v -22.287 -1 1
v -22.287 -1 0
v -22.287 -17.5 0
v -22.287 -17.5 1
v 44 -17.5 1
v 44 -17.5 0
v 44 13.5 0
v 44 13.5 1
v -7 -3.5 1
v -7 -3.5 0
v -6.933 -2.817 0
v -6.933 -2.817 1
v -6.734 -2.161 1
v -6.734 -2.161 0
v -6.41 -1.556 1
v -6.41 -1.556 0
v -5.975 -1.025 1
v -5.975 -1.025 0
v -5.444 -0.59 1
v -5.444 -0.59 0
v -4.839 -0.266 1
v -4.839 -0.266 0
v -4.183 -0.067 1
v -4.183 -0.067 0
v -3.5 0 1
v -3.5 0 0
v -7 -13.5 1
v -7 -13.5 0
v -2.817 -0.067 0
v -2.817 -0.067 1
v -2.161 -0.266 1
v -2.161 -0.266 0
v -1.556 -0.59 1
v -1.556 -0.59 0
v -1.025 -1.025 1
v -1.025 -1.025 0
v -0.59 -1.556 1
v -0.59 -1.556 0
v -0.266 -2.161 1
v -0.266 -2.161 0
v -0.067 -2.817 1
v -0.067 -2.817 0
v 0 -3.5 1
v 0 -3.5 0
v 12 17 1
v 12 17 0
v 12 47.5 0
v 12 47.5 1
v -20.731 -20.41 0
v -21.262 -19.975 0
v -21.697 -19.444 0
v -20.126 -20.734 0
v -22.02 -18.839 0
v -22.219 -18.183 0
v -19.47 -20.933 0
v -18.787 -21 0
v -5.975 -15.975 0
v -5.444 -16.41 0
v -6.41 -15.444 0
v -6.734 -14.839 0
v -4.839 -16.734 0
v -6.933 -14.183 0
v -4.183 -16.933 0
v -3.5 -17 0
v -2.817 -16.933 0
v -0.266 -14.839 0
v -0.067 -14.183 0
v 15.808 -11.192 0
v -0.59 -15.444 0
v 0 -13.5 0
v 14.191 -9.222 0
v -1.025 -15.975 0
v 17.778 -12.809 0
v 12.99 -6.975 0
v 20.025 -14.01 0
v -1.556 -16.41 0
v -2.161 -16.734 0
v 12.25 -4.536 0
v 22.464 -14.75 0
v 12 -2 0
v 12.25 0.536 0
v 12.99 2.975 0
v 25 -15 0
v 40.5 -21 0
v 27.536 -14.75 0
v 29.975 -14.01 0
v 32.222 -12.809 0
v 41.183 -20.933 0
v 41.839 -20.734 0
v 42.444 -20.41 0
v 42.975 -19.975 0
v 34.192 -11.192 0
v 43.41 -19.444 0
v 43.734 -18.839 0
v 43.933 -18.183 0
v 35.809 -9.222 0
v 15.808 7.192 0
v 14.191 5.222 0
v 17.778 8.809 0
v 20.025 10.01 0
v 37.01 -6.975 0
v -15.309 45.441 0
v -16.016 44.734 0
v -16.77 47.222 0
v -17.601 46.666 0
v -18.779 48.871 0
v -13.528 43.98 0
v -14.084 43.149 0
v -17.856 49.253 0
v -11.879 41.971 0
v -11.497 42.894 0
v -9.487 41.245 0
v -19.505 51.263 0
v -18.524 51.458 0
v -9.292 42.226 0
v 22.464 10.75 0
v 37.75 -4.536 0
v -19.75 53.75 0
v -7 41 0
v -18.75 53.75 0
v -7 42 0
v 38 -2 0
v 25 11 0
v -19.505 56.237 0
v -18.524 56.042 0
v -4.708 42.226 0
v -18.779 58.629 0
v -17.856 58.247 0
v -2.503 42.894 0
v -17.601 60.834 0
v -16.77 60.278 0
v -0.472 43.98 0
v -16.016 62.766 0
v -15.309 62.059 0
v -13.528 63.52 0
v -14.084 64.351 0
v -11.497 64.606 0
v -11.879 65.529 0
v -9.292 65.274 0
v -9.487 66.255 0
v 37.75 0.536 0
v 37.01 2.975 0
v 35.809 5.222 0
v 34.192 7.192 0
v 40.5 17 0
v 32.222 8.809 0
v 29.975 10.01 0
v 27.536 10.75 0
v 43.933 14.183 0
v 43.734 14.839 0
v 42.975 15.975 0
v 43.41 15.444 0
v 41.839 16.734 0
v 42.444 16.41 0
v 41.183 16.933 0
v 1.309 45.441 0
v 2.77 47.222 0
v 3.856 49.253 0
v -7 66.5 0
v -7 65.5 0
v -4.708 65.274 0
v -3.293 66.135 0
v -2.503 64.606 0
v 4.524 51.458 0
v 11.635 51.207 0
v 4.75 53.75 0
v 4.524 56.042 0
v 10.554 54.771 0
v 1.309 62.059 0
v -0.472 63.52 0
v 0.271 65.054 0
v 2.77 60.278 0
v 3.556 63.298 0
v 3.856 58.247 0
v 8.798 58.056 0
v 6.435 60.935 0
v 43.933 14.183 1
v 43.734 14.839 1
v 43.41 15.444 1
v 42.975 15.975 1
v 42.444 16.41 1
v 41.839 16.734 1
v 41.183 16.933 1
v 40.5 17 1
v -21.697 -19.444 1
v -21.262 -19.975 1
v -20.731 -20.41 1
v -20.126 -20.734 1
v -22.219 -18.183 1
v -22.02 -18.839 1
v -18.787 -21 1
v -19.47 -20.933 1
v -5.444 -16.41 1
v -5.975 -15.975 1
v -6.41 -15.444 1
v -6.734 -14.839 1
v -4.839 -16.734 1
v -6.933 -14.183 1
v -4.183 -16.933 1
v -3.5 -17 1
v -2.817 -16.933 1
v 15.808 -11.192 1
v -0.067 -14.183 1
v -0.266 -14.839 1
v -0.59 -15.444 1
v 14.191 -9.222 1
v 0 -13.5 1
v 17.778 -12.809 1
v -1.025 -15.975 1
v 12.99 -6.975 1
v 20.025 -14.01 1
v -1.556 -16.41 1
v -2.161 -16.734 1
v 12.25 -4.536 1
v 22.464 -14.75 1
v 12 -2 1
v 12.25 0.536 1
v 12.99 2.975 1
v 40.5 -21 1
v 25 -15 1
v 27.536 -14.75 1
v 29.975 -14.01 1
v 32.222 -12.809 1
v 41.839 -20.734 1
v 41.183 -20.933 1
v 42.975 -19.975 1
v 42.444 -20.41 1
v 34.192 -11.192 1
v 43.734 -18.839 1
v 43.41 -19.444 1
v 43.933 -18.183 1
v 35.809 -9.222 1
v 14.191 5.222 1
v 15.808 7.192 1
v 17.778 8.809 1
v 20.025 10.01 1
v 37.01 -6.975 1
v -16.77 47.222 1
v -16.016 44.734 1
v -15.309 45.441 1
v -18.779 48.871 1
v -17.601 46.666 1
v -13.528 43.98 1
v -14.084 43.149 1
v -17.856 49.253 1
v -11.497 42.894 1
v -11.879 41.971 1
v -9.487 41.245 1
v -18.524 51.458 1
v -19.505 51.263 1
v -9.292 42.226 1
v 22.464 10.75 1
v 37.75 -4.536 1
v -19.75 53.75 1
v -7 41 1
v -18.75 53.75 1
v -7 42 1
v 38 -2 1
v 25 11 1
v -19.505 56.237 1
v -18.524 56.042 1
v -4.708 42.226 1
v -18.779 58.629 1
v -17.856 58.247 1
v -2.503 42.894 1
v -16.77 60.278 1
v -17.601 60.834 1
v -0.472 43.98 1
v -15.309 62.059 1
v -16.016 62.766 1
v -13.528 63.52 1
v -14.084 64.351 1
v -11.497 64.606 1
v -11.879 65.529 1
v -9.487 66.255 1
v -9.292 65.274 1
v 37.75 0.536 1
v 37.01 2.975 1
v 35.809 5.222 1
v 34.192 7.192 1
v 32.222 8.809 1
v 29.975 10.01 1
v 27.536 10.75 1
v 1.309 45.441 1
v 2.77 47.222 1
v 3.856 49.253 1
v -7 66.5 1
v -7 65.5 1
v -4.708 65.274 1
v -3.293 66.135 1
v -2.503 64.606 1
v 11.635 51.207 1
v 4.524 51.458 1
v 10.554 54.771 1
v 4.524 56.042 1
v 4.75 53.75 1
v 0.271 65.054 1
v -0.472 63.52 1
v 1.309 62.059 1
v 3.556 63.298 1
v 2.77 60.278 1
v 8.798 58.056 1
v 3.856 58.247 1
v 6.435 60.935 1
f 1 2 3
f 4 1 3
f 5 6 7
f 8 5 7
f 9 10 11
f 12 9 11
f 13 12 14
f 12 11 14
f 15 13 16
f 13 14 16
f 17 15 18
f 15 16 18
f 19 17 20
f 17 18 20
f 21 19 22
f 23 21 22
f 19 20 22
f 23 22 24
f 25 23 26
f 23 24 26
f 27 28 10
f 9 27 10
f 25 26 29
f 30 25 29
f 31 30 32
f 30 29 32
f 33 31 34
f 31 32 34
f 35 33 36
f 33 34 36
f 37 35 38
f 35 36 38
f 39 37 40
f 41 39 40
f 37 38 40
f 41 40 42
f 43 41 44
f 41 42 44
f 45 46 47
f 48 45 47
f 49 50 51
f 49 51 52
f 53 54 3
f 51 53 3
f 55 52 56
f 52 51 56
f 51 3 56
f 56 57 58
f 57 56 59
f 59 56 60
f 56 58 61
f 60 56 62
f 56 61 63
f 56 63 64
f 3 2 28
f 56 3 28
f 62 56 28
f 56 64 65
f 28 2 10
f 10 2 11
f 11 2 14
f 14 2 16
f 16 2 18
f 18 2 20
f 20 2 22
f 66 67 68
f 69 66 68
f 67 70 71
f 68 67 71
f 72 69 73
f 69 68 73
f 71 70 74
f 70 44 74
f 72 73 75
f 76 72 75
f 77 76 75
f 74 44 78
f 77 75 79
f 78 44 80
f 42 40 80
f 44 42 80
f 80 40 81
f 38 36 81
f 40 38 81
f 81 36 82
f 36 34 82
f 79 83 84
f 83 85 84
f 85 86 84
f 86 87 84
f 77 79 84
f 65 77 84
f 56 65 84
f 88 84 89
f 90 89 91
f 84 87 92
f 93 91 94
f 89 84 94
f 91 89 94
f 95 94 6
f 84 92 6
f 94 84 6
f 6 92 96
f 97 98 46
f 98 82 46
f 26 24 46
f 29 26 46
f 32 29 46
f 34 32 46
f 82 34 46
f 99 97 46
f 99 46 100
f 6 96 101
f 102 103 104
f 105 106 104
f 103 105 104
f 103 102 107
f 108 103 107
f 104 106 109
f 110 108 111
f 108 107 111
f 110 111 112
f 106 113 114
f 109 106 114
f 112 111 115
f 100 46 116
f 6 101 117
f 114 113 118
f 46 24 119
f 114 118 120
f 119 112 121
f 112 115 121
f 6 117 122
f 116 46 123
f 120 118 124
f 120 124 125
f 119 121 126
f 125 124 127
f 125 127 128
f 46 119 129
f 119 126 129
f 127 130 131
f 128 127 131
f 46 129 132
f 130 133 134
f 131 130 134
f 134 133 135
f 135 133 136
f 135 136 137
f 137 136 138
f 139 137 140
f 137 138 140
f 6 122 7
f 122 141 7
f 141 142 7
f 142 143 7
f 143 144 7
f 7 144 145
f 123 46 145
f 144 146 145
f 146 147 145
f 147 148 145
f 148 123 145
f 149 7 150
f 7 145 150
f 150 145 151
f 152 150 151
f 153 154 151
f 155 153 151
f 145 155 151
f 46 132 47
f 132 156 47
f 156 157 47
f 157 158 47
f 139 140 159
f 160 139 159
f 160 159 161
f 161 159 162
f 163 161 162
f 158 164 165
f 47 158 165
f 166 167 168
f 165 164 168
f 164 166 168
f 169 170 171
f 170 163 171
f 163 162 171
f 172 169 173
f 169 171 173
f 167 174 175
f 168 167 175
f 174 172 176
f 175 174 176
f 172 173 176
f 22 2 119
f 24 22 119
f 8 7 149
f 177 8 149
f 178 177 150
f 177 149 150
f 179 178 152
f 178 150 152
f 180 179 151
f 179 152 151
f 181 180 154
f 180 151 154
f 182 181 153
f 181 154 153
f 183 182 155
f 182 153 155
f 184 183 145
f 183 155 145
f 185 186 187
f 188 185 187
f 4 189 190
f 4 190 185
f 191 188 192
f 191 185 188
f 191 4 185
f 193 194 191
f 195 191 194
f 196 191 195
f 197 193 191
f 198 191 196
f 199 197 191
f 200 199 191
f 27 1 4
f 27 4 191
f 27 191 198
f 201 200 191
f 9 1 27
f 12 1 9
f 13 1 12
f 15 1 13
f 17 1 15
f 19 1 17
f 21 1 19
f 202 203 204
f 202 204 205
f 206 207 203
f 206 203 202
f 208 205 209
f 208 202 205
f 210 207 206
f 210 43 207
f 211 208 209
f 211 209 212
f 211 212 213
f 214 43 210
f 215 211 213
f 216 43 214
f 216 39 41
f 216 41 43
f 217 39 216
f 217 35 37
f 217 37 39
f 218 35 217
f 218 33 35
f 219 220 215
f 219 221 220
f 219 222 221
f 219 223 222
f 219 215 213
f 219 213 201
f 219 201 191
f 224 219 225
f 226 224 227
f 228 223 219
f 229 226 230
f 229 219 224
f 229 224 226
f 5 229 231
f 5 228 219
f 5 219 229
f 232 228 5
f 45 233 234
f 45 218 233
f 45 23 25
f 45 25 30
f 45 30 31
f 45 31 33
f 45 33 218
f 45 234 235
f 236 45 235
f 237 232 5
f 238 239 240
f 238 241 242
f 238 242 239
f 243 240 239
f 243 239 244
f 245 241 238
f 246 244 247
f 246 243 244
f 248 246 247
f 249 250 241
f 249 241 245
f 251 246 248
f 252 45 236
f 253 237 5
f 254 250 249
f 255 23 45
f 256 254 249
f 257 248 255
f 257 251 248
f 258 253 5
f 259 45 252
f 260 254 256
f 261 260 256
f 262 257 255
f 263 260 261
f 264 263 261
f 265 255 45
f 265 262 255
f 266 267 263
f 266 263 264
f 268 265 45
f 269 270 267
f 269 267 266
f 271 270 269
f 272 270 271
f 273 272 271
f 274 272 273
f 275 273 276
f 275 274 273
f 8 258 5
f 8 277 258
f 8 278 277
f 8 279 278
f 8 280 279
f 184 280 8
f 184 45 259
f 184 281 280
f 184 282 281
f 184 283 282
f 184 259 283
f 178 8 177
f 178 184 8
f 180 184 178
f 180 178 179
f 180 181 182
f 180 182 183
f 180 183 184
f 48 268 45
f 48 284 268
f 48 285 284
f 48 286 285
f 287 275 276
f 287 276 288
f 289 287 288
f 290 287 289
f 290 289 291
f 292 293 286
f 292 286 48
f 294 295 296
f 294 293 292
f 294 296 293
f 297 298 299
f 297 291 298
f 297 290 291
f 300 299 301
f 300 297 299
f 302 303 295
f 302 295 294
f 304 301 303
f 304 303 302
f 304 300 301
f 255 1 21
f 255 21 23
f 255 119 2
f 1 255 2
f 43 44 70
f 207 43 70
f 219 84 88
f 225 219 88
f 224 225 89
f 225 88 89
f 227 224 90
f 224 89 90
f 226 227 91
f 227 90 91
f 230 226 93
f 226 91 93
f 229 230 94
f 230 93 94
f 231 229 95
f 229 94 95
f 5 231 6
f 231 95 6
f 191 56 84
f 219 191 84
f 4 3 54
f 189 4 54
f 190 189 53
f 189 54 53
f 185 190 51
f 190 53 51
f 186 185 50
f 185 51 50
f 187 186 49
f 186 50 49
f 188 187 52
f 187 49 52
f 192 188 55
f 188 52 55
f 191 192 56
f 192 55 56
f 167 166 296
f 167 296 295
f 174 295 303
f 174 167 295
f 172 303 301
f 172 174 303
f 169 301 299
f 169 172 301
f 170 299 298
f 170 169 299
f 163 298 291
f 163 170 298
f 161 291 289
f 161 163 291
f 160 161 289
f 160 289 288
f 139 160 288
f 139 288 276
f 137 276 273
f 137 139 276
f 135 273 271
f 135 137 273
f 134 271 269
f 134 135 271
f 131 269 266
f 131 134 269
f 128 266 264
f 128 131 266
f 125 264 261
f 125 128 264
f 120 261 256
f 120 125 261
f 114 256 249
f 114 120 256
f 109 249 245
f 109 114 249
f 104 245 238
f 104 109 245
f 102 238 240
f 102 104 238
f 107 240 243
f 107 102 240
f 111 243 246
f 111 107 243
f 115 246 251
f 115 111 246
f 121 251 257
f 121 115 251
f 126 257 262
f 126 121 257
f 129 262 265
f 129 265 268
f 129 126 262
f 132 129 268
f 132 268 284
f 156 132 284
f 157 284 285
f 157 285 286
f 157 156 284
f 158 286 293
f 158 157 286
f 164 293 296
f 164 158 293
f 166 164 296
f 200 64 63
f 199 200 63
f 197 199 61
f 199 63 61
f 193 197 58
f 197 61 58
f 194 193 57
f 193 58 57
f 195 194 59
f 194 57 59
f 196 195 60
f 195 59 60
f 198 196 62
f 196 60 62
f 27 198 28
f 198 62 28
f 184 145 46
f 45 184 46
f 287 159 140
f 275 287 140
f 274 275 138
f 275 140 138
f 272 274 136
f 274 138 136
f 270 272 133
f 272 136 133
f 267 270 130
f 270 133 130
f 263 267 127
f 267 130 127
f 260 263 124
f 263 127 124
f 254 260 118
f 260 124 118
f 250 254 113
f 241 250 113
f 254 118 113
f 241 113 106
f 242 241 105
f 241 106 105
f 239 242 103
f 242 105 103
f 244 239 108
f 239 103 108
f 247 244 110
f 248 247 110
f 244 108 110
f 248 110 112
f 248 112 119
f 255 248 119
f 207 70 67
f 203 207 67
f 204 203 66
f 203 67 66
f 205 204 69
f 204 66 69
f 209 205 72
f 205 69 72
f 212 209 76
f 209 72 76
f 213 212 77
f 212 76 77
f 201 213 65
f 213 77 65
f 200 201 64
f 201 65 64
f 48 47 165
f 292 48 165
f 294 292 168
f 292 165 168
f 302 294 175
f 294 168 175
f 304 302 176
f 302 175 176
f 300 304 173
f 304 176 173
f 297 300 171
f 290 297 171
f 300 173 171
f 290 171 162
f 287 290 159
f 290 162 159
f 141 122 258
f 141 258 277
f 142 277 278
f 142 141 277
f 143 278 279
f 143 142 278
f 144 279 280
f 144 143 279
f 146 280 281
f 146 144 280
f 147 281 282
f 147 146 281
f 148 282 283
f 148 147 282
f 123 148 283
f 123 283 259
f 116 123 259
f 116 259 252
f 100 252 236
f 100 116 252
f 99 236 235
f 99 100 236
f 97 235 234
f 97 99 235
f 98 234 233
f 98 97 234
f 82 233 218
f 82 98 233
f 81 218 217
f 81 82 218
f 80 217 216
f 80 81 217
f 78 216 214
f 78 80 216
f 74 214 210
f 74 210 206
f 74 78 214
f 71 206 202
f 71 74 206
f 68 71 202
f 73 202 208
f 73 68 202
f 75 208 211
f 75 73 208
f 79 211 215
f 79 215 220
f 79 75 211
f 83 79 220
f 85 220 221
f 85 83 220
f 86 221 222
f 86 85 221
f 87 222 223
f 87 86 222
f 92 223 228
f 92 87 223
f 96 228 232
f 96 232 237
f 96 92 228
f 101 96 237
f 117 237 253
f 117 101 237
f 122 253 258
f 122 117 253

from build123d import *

# Parameters (mm, degrees)
F0_R     = 13
F0_R_2   = 11.75
F1_DEPTH = 1


with BuildPart() as f1:
    # F0 (on Top) → F1 (new body)
    with BuildSketch(Plane.XY):
        with BuildLine():
            ThreePointArc((-7, 66.5), (2.015611, 62.765611), (5.75, 53.75))
            ThreePointArc((5.75, 53.75), (2.015611, 44.734389), (-7, 41))
            Line((-7, 41), (-22.28675, -1))
            Line((-22.28675, -1), (-22.28675, -17.5))
            ThreePointArc((-22.28675, -17.5), (-21.261624, -19.974874), (-18.78675, -21))
            Line((-18.78675, -21), (40.5, -21))
            ThreePointArc((40.5, -21), (42.974874, -19.974874), (44, -17.5))
            Line((44, -17.5), (44, 13.5))
            ThreePointArc((44, 13.5), (42.974874, 15.974874), (40.5, 17))
            Line((40.5, 17), (12, 17))
            Line((12, 17), (12, 47.5))
            ThreePointArc((12, 47.5), (6.435029, 60.935029), (-7, 66.5))
        make_face()
        with BuildLine():
            ThreePointArc((-3.5, 0), (-1.025126, -1.025126), (0, -3.5))
            Line((0, -3.5), (0, -13.5))
            ThreePointArc((0, -13.5), (-1.025126, -15.974874), (-3.5, -17))
            ThreePointArc((-3.5, -17), (-5.974874, -15.974874), (-7, -13.5))
            Line((-7, -13.5), (-7, -3.5))
            ThreePointArc((-7, -3.5), (-5.974874, -1.025126), (-3.5, 0))
        make_face(mode=Mode.SUBTRACT)
        with Locations((25, -2)):
            Circle(F0_R, mode=Mode.SUBTRACT)
        with BuildLine():
            ThreePointArc((-7, 41), (2.015611, 44.734389), (5.75, 53.75))
            ThreePointArc((5.75, 53.75), (2.015611, 62.765611), (-7, 66.5))
            ThreePointArc((-7, 66.5), (-19.75, 53.75), (-7, 41))
        make_face()
        with Locations((-7, 53.75)):
            Circle(F0_R_2, mode=Mode.SUBTRACT)
    extrude(amount=F1_DEPTH)


solid = f1.part
